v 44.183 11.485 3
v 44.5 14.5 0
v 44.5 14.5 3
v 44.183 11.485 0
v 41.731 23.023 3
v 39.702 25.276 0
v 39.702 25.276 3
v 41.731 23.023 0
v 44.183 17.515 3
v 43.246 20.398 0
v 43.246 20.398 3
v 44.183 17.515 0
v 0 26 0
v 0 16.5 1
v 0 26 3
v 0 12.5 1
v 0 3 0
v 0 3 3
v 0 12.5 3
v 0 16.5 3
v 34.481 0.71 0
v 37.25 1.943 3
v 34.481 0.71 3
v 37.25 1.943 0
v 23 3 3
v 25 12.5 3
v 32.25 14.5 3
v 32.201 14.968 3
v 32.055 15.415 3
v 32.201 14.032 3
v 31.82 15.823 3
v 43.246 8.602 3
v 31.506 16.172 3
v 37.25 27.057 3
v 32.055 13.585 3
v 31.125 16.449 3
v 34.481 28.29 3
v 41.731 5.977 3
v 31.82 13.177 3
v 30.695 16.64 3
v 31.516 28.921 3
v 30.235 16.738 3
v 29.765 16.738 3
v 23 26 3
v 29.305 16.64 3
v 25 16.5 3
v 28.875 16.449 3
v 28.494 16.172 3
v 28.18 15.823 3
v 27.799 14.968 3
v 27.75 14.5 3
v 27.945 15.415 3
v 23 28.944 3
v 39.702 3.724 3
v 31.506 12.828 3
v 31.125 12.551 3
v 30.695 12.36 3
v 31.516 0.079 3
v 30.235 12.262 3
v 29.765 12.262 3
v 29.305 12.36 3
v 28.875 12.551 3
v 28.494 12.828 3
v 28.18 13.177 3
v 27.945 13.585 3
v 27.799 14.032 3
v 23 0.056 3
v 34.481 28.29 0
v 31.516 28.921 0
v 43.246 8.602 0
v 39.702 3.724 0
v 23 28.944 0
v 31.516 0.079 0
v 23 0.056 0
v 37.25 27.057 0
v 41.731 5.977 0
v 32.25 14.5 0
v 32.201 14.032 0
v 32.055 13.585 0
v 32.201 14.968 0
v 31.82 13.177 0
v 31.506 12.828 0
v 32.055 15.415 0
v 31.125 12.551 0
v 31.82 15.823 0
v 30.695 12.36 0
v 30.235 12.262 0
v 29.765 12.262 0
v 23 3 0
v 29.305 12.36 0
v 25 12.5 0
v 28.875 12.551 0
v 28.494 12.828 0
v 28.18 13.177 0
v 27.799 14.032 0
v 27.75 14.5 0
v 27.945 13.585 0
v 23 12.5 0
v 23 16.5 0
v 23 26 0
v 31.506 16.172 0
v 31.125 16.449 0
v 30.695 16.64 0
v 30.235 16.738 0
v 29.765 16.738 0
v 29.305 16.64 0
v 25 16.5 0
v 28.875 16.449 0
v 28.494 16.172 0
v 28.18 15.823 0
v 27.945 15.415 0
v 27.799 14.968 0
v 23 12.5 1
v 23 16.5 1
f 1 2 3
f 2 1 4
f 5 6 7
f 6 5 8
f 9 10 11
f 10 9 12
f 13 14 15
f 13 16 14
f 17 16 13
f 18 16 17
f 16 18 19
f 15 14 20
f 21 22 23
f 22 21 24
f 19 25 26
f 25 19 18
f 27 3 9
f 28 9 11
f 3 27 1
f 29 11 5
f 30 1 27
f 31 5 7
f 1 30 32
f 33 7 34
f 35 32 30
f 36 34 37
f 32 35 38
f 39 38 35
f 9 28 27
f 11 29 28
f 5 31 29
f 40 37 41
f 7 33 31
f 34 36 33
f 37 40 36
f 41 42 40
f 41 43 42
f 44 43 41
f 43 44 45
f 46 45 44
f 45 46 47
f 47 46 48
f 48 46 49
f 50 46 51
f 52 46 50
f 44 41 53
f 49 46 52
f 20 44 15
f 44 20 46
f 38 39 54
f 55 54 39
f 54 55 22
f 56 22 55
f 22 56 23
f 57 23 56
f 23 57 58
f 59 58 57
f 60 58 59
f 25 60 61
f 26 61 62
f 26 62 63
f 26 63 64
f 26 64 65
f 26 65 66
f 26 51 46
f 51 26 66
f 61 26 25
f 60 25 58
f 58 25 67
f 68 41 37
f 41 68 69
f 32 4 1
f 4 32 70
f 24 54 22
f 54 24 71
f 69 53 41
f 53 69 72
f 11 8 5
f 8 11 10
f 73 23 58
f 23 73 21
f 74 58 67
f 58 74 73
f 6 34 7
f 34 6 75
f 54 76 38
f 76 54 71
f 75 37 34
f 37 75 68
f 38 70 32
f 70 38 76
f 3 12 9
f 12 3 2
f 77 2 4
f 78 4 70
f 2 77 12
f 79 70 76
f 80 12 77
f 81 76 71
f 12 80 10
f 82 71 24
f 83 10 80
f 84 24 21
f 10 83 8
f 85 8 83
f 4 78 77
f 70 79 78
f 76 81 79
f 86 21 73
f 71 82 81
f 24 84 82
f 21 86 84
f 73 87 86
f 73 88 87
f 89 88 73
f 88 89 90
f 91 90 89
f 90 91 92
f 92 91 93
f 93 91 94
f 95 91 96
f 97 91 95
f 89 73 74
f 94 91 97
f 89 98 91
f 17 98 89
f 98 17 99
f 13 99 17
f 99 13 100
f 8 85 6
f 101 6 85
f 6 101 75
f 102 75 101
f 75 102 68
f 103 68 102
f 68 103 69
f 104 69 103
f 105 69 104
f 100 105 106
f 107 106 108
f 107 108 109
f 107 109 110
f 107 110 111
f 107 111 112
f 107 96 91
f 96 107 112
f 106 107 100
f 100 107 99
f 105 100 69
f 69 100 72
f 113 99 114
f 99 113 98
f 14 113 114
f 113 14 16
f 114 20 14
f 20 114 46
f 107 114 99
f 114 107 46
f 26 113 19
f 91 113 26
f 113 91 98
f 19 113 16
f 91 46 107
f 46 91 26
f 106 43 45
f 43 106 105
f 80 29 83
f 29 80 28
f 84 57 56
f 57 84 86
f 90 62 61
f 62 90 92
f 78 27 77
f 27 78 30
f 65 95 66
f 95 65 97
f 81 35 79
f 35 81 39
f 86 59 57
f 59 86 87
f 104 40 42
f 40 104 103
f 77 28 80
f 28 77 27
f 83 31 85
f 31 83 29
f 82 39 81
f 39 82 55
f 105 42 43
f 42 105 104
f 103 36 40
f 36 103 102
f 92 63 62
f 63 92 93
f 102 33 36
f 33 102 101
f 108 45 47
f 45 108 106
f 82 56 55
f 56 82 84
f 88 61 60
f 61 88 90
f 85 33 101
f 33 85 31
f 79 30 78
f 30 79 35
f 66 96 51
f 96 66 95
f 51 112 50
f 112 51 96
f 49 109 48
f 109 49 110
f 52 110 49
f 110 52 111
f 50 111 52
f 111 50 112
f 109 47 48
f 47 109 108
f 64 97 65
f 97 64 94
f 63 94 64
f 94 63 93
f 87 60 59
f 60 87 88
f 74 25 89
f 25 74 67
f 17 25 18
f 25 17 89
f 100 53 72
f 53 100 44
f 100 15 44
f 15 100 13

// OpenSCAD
a = 6; // Gap between bars
b = 20; // width of the bars
c = 29; // Width of whole thing
d = 24; // Width of slot
e = 3; // Outside wall thickness, and 45 degree area width
f = 200; // length of bar this must be in center of
g = 4; // Slot width for cable tie
h = 20; // Slide length
i = 4.5; // Screw hole diameter
j = 6.8; // Nut width
k = 0.5; // Slot for line
t = 0.25; // tolerance


$fs=0.02;
difference() {
    // Main shape
    hull() {
        cube([e,c,e]);
        translate([b+10,c/2,0]) cylinder(e, r=c/2);
    }
    translate([0,(c-g)/2,e-g/2]) cube([b+e,g,g]);
    translate([b+e,(c-g)/2,0]) cube([g/2,g,e]);

    translate([b+10,c/2,e]) cylinder(b,r=i/2,center=true);
    cube([b+e,e,e]);
    translate([0,c-e,0]) cube([b+e,e,e]);
}
